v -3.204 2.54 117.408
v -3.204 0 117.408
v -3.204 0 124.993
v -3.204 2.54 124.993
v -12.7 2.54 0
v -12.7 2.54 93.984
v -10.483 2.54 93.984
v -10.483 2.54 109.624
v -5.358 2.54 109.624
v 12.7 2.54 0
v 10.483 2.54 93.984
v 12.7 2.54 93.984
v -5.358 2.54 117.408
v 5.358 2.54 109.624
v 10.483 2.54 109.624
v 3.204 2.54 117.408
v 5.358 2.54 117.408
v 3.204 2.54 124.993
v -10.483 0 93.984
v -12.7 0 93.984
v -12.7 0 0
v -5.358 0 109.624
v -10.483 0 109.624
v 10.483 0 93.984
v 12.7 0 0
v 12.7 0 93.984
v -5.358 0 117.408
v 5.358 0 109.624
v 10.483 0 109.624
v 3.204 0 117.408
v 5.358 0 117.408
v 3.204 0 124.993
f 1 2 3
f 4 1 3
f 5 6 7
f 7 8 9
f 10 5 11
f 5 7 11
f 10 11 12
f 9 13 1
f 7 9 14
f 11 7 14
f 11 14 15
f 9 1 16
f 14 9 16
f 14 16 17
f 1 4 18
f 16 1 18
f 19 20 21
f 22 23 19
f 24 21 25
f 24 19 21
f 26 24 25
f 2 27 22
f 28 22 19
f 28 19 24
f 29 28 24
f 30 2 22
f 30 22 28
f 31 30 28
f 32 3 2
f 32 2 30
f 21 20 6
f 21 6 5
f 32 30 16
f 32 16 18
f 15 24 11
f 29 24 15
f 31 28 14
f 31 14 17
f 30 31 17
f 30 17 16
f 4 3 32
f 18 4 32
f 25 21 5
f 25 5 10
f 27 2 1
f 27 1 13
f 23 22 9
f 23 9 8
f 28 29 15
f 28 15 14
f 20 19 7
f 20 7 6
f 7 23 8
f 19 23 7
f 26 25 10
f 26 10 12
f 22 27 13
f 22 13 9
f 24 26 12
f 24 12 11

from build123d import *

# Parameters (mm, degrees)
F0_W     = 6.408992
F0_H     = 7.585215
F1_DEPTH = 2.54


with BuildPart() as f1:
    # F0 (on Front) → F1 (new body)
    with BuildSketch(Plane.XZ):
        Polygon((-12.7, 0), (0, 0), (12.7, 0), (12.7, 93.983997), (10.482716, 93.983997), (-10.482716, 93.983997), (-12.7, 93.983997), align=None)
        Polygon((-10.482716, 109.624464), (-10.482716, 93.983997), (10.482716, 93.983997), (10.482716, 109.624464), (5.35761, 109.624464), (-5.35761, 109.624464), align=None)
        Polygon((-5.35761, 117.408185), (-5.35761, 109.624464), (5.35761, 109.624464), (5.35761, 117.408185), (3.204496, 117.408185), (-3.204496, 117.408185), align=None)
        with Locations((0, 121.200792)):
            Rectangle(F0_W, F0_H)
    extrude(amount=-F1_DEPTH)


solid = f1.part
